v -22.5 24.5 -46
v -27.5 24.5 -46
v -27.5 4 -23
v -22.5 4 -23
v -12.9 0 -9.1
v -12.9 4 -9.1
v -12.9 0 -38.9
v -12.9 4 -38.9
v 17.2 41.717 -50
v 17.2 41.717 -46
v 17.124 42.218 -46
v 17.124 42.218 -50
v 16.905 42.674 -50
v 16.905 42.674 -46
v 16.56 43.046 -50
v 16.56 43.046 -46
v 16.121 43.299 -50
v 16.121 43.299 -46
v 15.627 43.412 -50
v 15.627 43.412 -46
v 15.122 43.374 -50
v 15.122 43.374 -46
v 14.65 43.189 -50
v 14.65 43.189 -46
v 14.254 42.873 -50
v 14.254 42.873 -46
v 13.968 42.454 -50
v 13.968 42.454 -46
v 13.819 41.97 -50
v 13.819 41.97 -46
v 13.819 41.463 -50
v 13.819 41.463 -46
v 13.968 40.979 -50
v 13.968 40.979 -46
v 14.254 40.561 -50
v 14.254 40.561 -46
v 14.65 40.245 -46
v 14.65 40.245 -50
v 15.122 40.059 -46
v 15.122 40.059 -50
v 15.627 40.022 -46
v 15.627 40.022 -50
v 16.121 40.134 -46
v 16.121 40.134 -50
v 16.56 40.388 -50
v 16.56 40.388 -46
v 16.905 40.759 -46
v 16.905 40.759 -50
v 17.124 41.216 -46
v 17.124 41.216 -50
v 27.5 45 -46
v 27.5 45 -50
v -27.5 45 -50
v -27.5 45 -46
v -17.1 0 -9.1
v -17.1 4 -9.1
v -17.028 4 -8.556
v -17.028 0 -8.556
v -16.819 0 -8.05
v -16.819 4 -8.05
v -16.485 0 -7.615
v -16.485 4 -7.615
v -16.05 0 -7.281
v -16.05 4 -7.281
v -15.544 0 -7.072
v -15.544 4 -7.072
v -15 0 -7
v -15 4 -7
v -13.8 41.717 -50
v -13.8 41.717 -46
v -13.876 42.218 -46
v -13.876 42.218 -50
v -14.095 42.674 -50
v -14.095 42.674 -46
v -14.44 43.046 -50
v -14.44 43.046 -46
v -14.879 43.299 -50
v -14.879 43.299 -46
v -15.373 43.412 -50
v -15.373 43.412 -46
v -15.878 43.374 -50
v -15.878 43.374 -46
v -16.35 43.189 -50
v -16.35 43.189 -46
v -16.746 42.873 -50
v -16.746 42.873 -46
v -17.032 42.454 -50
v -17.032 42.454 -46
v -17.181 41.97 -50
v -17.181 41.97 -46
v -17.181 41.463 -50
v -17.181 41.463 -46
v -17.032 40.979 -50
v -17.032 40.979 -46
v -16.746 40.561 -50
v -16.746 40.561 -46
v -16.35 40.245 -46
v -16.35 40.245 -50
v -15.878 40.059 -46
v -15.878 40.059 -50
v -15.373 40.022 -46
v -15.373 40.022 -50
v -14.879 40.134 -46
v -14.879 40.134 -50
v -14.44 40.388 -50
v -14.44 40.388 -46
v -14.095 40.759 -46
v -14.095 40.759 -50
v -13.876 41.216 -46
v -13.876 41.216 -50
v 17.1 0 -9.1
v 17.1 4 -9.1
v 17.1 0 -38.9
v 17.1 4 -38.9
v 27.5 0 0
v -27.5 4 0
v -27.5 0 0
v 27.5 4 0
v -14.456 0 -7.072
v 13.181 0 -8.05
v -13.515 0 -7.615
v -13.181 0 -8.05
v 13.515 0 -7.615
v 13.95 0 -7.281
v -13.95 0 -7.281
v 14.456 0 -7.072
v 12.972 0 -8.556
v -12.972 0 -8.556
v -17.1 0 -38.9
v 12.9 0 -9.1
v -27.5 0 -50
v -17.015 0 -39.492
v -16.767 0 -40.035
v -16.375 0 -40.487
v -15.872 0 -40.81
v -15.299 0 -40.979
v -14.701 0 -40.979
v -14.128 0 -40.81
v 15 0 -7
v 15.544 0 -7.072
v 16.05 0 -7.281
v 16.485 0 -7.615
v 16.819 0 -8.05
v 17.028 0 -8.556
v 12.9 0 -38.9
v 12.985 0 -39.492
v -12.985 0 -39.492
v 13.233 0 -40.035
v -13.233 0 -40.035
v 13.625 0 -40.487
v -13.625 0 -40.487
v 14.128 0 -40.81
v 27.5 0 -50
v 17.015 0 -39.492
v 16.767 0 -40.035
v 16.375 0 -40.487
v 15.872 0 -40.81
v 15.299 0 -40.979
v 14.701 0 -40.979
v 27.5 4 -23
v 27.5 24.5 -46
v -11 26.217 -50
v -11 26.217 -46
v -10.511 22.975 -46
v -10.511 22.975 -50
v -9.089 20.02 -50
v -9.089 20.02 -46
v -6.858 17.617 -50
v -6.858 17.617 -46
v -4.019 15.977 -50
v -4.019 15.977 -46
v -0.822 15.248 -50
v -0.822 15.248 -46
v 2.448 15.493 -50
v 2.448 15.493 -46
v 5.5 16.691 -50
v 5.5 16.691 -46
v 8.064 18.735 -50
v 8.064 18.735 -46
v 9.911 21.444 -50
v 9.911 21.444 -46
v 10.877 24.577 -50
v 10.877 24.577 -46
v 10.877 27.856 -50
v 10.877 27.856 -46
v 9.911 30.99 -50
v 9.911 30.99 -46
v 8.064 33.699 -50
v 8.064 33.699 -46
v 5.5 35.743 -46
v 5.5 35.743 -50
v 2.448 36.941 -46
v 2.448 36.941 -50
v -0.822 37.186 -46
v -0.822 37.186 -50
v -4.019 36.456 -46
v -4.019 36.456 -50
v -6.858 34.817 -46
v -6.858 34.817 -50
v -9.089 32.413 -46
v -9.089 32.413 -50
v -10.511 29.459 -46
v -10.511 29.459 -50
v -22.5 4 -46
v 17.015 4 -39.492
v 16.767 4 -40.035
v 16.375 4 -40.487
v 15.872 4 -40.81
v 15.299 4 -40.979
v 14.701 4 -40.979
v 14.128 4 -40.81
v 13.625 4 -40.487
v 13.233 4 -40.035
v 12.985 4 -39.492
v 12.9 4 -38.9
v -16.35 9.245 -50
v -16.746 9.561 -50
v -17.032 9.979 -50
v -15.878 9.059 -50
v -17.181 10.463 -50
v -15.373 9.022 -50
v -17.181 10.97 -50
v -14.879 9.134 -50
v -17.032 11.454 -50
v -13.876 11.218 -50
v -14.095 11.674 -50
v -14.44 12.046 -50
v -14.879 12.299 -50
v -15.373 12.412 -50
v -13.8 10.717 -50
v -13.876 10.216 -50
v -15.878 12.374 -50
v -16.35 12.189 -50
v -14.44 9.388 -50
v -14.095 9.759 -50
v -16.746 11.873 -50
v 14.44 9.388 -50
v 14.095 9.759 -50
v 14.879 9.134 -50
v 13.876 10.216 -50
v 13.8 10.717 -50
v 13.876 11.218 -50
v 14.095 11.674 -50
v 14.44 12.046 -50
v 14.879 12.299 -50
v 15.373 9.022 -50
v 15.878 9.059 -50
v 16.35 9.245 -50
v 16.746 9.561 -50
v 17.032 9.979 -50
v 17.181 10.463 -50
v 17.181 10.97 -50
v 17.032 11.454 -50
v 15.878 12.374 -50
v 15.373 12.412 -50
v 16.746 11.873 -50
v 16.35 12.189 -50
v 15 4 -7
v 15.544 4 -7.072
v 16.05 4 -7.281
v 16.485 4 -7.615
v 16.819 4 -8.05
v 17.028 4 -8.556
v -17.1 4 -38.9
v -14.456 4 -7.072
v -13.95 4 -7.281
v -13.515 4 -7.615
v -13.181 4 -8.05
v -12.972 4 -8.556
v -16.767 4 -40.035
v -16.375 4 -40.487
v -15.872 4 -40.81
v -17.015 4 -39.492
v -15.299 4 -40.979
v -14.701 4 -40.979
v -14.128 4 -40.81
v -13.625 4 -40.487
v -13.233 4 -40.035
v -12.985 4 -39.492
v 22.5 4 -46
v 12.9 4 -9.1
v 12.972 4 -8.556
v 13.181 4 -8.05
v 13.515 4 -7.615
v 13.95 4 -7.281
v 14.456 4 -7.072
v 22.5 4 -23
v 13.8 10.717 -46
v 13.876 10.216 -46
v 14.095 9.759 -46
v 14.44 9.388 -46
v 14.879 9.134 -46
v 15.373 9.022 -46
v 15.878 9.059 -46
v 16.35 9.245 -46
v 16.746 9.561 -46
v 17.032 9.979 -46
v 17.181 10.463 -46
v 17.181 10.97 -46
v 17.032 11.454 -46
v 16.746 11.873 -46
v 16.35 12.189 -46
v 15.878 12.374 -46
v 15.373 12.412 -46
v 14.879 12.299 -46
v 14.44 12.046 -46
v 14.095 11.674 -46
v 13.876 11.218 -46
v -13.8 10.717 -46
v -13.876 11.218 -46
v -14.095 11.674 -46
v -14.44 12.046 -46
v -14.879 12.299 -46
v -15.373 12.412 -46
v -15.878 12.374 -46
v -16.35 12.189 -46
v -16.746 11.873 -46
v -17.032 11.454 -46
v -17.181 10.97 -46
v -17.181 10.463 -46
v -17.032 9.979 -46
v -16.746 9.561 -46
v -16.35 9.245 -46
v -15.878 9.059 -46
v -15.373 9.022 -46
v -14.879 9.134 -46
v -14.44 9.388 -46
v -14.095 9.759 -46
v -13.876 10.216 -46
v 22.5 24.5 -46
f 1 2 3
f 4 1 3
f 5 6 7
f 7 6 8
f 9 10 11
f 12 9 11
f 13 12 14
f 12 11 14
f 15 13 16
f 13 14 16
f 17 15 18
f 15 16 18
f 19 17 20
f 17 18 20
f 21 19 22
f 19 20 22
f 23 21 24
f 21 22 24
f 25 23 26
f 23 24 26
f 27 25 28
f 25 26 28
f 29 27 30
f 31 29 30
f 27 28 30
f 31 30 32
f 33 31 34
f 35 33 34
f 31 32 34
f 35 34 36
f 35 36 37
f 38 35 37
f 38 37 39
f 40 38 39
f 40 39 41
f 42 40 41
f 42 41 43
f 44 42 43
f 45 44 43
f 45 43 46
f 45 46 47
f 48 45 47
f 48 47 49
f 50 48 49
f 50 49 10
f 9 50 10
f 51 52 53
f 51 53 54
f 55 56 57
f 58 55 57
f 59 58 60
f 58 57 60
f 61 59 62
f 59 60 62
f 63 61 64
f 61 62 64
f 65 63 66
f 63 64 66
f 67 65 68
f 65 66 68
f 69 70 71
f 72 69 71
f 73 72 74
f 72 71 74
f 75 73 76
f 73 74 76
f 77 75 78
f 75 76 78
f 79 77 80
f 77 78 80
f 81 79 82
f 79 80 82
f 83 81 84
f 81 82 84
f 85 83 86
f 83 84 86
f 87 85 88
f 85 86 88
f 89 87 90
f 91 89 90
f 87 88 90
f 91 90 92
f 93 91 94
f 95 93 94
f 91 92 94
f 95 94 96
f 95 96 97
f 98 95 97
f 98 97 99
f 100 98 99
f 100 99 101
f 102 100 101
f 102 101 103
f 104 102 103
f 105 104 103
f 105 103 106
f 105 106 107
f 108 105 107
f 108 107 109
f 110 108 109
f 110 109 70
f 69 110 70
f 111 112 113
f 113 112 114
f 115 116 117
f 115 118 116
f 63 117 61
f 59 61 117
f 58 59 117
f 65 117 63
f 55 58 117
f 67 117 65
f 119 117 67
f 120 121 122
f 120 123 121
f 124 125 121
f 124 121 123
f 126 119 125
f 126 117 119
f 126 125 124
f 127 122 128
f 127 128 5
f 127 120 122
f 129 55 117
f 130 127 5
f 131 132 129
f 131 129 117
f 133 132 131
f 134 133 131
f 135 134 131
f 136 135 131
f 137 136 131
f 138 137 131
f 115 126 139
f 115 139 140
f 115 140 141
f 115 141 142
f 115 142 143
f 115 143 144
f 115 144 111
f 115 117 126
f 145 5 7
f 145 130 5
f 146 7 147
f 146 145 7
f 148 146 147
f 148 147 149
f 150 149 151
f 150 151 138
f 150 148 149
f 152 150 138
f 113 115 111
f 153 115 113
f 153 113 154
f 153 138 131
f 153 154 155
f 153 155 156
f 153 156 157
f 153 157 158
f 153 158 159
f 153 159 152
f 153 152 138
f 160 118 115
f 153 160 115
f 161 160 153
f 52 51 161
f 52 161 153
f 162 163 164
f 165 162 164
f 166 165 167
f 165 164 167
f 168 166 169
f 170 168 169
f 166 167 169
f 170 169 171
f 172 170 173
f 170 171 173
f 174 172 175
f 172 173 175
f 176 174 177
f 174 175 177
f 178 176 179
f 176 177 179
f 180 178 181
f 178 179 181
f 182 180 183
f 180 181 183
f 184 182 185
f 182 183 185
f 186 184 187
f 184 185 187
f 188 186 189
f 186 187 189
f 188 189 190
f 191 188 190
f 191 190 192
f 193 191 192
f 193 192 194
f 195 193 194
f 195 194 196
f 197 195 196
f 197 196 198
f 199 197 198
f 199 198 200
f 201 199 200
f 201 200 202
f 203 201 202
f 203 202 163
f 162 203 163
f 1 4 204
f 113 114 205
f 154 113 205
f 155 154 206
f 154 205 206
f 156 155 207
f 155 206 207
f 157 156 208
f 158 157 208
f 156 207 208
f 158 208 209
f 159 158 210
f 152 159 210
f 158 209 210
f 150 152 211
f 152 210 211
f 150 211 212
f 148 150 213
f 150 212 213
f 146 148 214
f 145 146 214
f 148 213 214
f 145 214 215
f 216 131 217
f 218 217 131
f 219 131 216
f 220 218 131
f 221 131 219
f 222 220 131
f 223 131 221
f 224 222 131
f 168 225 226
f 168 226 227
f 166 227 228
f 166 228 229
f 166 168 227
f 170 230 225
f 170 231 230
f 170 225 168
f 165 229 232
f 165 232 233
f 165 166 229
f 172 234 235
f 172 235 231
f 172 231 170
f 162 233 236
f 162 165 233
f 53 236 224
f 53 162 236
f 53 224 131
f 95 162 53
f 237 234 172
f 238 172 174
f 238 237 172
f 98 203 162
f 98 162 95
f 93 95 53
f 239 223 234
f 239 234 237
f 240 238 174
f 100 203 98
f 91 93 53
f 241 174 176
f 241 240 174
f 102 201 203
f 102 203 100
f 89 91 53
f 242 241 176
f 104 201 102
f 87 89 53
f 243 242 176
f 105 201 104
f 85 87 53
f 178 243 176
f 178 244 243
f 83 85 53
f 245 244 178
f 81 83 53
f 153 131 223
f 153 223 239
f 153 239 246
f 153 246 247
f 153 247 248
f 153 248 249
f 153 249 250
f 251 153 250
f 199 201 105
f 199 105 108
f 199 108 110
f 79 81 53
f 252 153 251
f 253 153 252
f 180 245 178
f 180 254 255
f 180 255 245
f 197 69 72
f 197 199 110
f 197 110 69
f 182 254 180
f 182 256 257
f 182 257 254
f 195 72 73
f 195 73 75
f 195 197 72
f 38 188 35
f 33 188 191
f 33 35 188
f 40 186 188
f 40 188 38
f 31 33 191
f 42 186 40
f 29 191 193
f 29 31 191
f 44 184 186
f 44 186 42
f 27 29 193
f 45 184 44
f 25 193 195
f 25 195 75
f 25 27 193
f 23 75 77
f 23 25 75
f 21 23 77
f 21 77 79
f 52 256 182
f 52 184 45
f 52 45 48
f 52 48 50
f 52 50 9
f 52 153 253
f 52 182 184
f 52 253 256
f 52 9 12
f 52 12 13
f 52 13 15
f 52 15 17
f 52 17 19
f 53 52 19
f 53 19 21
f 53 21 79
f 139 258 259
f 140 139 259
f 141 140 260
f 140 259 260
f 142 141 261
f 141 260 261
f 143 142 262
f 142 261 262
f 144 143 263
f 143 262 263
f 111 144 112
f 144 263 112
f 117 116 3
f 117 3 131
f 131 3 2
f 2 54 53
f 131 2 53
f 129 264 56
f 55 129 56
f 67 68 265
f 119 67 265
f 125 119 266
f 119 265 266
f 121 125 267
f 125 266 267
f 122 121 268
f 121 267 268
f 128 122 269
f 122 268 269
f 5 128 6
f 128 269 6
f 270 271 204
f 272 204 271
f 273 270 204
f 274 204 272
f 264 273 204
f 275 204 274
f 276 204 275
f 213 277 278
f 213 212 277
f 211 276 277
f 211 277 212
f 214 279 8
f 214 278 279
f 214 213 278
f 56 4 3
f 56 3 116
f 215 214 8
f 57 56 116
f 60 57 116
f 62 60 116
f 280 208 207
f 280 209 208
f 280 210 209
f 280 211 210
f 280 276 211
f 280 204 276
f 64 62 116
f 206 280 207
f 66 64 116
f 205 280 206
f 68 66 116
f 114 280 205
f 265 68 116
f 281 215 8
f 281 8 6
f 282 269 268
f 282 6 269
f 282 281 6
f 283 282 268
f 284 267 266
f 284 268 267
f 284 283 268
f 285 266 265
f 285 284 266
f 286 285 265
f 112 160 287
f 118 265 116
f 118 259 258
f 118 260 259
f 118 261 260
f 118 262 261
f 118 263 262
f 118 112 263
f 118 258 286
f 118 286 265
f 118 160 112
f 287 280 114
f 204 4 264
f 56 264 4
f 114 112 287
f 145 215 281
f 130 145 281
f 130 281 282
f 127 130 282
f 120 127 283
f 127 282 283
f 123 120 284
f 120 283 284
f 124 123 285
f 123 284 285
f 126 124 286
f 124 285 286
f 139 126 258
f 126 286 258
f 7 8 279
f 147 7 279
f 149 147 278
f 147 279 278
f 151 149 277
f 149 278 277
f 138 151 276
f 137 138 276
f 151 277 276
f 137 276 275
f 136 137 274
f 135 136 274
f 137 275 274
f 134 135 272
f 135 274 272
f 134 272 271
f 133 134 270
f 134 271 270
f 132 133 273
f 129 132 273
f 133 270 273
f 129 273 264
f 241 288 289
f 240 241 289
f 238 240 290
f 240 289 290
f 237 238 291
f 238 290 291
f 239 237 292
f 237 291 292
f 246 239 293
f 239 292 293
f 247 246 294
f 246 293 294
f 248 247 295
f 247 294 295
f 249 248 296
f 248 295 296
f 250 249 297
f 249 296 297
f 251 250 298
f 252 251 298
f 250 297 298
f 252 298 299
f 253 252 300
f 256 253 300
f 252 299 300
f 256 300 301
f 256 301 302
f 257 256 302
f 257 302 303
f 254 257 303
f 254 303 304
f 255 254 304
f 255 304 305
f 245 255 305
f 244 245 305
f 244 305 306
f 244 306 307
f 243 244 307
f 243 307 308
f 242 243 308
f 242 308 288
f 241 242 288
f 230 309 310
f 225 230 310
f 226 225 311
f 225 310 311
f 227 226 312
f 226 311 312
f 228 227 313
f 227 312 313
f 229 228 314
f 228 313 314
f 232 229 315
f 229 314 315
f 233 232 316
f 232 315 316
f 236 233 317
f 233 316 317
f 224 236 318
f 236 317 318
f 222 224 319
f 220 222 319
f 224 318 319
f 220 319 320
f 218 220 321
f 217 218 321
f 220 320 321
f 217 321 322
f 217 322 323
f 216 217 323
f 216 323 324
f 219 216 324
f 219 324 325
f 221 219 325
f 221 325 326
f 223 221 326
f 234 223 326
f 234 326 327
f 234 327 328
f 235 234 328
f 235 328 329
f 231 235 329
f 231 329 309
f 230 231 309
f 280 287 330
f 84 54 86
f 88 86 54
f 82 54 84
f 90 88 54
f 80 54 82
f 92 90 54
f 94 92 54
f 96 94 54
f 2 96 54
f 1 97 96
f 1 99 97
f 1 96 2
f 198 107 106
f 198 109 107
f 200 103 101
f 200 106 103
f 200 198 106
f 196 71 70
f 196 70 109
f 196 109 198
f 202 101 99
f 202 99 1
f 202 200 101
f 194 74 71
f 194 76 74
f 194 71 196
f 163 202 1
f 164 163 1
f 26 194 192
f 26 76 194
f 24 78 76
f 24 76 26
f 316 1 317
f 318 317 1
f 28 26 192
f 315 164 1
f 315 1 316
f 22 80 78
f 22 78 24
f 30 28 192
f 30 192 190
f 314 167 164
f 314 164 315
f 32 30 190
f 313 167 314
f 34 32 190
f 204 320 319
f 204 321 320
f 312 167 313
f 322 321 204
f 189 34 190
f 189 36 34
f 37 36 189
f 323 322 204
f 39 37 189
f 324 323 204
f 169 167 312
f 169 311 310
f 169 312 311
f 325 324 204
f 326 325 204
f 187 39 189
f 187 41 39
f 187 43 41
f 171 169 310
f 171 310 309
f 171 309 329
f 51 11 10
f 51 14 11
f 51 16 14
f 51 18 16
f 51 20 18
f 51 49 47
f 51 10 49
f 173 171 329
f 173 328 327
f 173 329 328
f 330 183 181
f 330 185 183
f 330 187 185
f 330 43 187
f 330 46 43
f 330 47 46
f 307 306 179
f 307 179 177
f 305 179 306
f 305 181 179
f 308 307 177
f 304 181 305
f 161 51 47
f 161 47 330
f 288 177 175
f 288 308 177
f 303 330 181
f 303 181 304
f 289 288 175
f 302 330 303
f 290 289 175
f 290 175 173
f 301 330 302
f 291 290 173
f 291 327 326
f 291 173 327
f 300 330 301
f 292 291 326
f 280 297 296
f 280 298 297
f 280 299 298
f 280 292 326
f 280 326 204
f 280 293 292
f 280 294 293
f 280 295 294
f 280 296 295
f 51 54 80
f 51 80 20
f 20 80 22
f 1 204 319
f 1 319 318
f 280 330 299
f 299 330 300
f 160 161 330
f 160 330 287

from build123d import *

# Parameters (mm, degrees)
BOSS_EXTRUDE1_DEPTH = 27.5
CUT_EXTRUDE1_REACH  = 72.266
CUT_EXTRUDE2_REACH  = 71.98
BOSS_EXTRUDE2_DEPTH = 5
BOSS_EXTRUDE3_START = -55
BOSS_EXTRUDE3_DEPTH = 5


with BuildPart() as part:
    # Sketch1 → Boss-Extrude1 (new, symmetric)
    with BuildSketch(Plane(origin=(0, 0, 0), x_dir=(0, 0, -1), z_dir=(1, 0, 0))):
        Polygon((0, 0), (50, 0), (50, 45), (46, 45), (46, 4), (0, 4), align=None)
    extrude(amount=BOSS_EXTRUDE1_DEPTH, both=True)

    # Sketch2 → Cut-Extrude1 (cut, up to next)
    with BuildSketch(Plane(origin=(0, 4, 0), x_dir=(1, 0, 0), z_dir=(0, 1, 0)), mode=Mode.PRIVATE) as cut_extrude1_sk1:
        with BuildLine():
            Line((-12.9, 9.1), (-12.9, 38.9))
            ThreePointArc((-12.9, 38.9), (-15, 41), (-17.1, 38.9))
            Line((-17.1, 38.9), (-17.1, 9.1))
            ThreePointArc((-17.1, 9.1), (-16.48492424, 7.61507576), (-15, 7))
            ThreePointArc((-15, 7), (-13.51507576, 7.61507576), (-12.9, 9.1))
        make_face()
    cut_extrude1_tool1 = extrude(cut_extrude1_sk1.sketch, amount=-CUT_EXTRUDE1_REACH, mode=Mode.PRIVATE) & part.part
    # Sketch2 → Cut-Extrude1 (cut, up to next)
    with BuildSketch(Plane(origin=(0, 4, 0), x_dir=(1, 0, 0), z_dir=(0, 1, 0)), mode=Mode.PRIVATE) as cut_extrude1_sk2:
        with BuildLine():
            Line((12.9, 38.9), (12.9, 9.1))
            ThreePointArc((12.9, 9.1), (13.51507576, 7.61507576), (15, 7))
            ThreePointArc((15, 7), (16.48492424, 7.61507576), (17.1, 9.1))
            Line((17.1, 9.1), (17.1, 38.9))
            ThreePointArc((17.1, 38.9), (15, 41), (12.9, 38.9))
        make_face()
    cut_extrude1_tool2 = extrude(cut_extrude1_sk2.sketch, amount=-CUT_EXTRUDE1_REACH, mode=Mode.PRIVATE) & part.part
    add(cut_extrude1_tool1.solids().sort_by_distance((-15, 4, -24))[0], mode=Mode.SUBTRACT)
    add(cut_extrude1_tool2.solids().sort_by_distance((15, 4, -24))[0], mode=Mode.SUBTRACT)

    # Sketch3 → Cut-Extrude2 (cut, up to next)
    with BuildSketch(Plane.XY.offset(-46), mode=Mode.PRIVATE) as cut_extrude2_sk1:
        with BuildLine():
            ThreePointArc((11, 26.216818276), (0, 37.216818276), (-11, 26.216818276))
            ThreePointArc((-11, 26.216818276), (0, 15.216818276), (11, 26.216818276))
        make_face()
    cut_extrude2_tool1 = extrude(cut_extrude2_sk1.sketch, amount=-CUT_EXTRUDE2_REACH, mode=Mode.PRIVATE) & part.part
    # Sketch3 → Cut-Extrude2 (cut, up to next)
    with BuildSketch(Plane.XY.offset(-46), mode=Mode.PRIVATE) as cut_extrude2_sk2:
        with BuildLine():
            ThreePointArc((-17.2, 10.716818276), (-15.5, 9.016818276), (-13.8, 10.716818276))
            ThreePointArc((-13.8, 10.716818276), (-15.5, 12.416818276), (-17.2, 10.716818276))
        make_face()
    cut_extrude2_tool2 = extrude(cut_extrude2_sk2.sketch, amount=-CUT_EXTRUDE2_REACH, mode=Mode.PRIVATE) & part.part
    # Sketch3 → Cut-Extrude2 (cut, up to next)
    with BuildSketch(Plane.XY.offset(-46), mode=Mode.PRIVATE) as cut_extrude2_sk3:
        with BuildLine():
            ThreePointArc((-17.2, 41.716818276), (-15.5, 40.016818276), (-13.8, 41.716818276))
            ThreePointArc((-13.8, 41.716818276), (-15.5, 43.416818276), (-17.2, 41.716818276))
        make_face()
    cut_extrude2_tool3 = extrude(cut_extrude2_sk3.sketch, amount=-CUT_EXTRUDE2_REACH, mode=Mode.PRIVATE) & part.part
    # Sketch3 → Cut-Extrude2 (cut, up to next)
    with BuildSketch(Plane.XY.offset(-46), mode=Mode.PRIVATE) as cut_extrude2_sk4:
        with BuildLine():
            ThreePointArc((13.8, 41.716818276), (15.5, 40.016818276), (17.2, 41.716818276))
            ThreePointArc((17.2, 41.716818276), (15.5, 43.416818276), (13.8, 41.716818276))
        make_face()
    cut_extrude2_tool4 = extrude(cut_extrude2_sk4.sketch, amount=-CUT_EXTRUDE2_REACH, mode=Mode.PRIVATE) & part.part
    # Sketch3 → Cut-Extrude2 (cut, up to next)
    with BuildSketch(Plane.XY.offset(-46), mode=Mode.PRIVATE) as cut_extrude2_sk5:
        with BuildLine():
            ThreePointArc((17.2, 10.716818276), (15.5, 12.416818276), (13.8, 10.716818276))
            ThreePointArc((13.8, 10.716818276), (15.5, 9.016818276), (17.2, 10.716818276))
        make_face()
    cut_extrude2_tool5 = extrude(cut_extrude2_sk5.sketch, amount=-CUT_EXTRUDE2_REACH, mode=Mode.PRIVATE) & part.part
    add(cut_extrude2_tool1.solids().sort_by_distance((0, 26.216818, -46))[0], mode=Mode.SUBTRACT)
    add(cut_extrude2_tool2.solids().sort_by_distance((-15.5, 10.716818, -46))[0], mode=Mode.SUBTRACT)
    add(cut_extrude2_tool3.solids().sort_by_distance((-15.5, 41.716818, -46))[0], mode=Mode.SUBTRACT)
    add(cut_extrude2_tool4.solids().sort_by_distance((15.5, 41.716818, -46))[0], mode=Mode.SUBTRACT)
    add(cut_extrude2_tool5.solids().sort_by_distance((15.5, 10.716818, -46))[0], mode=Mode.SUBTRACT)

    # Sketch5 → Boss-Extrude2 (add)
    with BuildSketch(Plane(origin=(27.5, 0, 0), x_dir=(0, 0, -1), z_dir=(1, 0, 0))):
        Polygon((46, 24.5), (23, 4), (46, 4), align=None)
    extrude(amount=-BOSS_EXTRUDE2_DEPTH)

    # Sketch5<2> → Boss-Extrude3 (add)
    with BuildSketch(Plane(origin=(27.5, 0, 0), x_dir=(0, 0, -1), z_dir=(1, 0, 0)).offset(BOSS_EXTRUDE3_START)):
        Polygon((46, 24.5), (23, 4), (46, 4), align=None)
    extrude(amount=BOSS_EXTRUDE3_DEPTH)


solid = part.part
